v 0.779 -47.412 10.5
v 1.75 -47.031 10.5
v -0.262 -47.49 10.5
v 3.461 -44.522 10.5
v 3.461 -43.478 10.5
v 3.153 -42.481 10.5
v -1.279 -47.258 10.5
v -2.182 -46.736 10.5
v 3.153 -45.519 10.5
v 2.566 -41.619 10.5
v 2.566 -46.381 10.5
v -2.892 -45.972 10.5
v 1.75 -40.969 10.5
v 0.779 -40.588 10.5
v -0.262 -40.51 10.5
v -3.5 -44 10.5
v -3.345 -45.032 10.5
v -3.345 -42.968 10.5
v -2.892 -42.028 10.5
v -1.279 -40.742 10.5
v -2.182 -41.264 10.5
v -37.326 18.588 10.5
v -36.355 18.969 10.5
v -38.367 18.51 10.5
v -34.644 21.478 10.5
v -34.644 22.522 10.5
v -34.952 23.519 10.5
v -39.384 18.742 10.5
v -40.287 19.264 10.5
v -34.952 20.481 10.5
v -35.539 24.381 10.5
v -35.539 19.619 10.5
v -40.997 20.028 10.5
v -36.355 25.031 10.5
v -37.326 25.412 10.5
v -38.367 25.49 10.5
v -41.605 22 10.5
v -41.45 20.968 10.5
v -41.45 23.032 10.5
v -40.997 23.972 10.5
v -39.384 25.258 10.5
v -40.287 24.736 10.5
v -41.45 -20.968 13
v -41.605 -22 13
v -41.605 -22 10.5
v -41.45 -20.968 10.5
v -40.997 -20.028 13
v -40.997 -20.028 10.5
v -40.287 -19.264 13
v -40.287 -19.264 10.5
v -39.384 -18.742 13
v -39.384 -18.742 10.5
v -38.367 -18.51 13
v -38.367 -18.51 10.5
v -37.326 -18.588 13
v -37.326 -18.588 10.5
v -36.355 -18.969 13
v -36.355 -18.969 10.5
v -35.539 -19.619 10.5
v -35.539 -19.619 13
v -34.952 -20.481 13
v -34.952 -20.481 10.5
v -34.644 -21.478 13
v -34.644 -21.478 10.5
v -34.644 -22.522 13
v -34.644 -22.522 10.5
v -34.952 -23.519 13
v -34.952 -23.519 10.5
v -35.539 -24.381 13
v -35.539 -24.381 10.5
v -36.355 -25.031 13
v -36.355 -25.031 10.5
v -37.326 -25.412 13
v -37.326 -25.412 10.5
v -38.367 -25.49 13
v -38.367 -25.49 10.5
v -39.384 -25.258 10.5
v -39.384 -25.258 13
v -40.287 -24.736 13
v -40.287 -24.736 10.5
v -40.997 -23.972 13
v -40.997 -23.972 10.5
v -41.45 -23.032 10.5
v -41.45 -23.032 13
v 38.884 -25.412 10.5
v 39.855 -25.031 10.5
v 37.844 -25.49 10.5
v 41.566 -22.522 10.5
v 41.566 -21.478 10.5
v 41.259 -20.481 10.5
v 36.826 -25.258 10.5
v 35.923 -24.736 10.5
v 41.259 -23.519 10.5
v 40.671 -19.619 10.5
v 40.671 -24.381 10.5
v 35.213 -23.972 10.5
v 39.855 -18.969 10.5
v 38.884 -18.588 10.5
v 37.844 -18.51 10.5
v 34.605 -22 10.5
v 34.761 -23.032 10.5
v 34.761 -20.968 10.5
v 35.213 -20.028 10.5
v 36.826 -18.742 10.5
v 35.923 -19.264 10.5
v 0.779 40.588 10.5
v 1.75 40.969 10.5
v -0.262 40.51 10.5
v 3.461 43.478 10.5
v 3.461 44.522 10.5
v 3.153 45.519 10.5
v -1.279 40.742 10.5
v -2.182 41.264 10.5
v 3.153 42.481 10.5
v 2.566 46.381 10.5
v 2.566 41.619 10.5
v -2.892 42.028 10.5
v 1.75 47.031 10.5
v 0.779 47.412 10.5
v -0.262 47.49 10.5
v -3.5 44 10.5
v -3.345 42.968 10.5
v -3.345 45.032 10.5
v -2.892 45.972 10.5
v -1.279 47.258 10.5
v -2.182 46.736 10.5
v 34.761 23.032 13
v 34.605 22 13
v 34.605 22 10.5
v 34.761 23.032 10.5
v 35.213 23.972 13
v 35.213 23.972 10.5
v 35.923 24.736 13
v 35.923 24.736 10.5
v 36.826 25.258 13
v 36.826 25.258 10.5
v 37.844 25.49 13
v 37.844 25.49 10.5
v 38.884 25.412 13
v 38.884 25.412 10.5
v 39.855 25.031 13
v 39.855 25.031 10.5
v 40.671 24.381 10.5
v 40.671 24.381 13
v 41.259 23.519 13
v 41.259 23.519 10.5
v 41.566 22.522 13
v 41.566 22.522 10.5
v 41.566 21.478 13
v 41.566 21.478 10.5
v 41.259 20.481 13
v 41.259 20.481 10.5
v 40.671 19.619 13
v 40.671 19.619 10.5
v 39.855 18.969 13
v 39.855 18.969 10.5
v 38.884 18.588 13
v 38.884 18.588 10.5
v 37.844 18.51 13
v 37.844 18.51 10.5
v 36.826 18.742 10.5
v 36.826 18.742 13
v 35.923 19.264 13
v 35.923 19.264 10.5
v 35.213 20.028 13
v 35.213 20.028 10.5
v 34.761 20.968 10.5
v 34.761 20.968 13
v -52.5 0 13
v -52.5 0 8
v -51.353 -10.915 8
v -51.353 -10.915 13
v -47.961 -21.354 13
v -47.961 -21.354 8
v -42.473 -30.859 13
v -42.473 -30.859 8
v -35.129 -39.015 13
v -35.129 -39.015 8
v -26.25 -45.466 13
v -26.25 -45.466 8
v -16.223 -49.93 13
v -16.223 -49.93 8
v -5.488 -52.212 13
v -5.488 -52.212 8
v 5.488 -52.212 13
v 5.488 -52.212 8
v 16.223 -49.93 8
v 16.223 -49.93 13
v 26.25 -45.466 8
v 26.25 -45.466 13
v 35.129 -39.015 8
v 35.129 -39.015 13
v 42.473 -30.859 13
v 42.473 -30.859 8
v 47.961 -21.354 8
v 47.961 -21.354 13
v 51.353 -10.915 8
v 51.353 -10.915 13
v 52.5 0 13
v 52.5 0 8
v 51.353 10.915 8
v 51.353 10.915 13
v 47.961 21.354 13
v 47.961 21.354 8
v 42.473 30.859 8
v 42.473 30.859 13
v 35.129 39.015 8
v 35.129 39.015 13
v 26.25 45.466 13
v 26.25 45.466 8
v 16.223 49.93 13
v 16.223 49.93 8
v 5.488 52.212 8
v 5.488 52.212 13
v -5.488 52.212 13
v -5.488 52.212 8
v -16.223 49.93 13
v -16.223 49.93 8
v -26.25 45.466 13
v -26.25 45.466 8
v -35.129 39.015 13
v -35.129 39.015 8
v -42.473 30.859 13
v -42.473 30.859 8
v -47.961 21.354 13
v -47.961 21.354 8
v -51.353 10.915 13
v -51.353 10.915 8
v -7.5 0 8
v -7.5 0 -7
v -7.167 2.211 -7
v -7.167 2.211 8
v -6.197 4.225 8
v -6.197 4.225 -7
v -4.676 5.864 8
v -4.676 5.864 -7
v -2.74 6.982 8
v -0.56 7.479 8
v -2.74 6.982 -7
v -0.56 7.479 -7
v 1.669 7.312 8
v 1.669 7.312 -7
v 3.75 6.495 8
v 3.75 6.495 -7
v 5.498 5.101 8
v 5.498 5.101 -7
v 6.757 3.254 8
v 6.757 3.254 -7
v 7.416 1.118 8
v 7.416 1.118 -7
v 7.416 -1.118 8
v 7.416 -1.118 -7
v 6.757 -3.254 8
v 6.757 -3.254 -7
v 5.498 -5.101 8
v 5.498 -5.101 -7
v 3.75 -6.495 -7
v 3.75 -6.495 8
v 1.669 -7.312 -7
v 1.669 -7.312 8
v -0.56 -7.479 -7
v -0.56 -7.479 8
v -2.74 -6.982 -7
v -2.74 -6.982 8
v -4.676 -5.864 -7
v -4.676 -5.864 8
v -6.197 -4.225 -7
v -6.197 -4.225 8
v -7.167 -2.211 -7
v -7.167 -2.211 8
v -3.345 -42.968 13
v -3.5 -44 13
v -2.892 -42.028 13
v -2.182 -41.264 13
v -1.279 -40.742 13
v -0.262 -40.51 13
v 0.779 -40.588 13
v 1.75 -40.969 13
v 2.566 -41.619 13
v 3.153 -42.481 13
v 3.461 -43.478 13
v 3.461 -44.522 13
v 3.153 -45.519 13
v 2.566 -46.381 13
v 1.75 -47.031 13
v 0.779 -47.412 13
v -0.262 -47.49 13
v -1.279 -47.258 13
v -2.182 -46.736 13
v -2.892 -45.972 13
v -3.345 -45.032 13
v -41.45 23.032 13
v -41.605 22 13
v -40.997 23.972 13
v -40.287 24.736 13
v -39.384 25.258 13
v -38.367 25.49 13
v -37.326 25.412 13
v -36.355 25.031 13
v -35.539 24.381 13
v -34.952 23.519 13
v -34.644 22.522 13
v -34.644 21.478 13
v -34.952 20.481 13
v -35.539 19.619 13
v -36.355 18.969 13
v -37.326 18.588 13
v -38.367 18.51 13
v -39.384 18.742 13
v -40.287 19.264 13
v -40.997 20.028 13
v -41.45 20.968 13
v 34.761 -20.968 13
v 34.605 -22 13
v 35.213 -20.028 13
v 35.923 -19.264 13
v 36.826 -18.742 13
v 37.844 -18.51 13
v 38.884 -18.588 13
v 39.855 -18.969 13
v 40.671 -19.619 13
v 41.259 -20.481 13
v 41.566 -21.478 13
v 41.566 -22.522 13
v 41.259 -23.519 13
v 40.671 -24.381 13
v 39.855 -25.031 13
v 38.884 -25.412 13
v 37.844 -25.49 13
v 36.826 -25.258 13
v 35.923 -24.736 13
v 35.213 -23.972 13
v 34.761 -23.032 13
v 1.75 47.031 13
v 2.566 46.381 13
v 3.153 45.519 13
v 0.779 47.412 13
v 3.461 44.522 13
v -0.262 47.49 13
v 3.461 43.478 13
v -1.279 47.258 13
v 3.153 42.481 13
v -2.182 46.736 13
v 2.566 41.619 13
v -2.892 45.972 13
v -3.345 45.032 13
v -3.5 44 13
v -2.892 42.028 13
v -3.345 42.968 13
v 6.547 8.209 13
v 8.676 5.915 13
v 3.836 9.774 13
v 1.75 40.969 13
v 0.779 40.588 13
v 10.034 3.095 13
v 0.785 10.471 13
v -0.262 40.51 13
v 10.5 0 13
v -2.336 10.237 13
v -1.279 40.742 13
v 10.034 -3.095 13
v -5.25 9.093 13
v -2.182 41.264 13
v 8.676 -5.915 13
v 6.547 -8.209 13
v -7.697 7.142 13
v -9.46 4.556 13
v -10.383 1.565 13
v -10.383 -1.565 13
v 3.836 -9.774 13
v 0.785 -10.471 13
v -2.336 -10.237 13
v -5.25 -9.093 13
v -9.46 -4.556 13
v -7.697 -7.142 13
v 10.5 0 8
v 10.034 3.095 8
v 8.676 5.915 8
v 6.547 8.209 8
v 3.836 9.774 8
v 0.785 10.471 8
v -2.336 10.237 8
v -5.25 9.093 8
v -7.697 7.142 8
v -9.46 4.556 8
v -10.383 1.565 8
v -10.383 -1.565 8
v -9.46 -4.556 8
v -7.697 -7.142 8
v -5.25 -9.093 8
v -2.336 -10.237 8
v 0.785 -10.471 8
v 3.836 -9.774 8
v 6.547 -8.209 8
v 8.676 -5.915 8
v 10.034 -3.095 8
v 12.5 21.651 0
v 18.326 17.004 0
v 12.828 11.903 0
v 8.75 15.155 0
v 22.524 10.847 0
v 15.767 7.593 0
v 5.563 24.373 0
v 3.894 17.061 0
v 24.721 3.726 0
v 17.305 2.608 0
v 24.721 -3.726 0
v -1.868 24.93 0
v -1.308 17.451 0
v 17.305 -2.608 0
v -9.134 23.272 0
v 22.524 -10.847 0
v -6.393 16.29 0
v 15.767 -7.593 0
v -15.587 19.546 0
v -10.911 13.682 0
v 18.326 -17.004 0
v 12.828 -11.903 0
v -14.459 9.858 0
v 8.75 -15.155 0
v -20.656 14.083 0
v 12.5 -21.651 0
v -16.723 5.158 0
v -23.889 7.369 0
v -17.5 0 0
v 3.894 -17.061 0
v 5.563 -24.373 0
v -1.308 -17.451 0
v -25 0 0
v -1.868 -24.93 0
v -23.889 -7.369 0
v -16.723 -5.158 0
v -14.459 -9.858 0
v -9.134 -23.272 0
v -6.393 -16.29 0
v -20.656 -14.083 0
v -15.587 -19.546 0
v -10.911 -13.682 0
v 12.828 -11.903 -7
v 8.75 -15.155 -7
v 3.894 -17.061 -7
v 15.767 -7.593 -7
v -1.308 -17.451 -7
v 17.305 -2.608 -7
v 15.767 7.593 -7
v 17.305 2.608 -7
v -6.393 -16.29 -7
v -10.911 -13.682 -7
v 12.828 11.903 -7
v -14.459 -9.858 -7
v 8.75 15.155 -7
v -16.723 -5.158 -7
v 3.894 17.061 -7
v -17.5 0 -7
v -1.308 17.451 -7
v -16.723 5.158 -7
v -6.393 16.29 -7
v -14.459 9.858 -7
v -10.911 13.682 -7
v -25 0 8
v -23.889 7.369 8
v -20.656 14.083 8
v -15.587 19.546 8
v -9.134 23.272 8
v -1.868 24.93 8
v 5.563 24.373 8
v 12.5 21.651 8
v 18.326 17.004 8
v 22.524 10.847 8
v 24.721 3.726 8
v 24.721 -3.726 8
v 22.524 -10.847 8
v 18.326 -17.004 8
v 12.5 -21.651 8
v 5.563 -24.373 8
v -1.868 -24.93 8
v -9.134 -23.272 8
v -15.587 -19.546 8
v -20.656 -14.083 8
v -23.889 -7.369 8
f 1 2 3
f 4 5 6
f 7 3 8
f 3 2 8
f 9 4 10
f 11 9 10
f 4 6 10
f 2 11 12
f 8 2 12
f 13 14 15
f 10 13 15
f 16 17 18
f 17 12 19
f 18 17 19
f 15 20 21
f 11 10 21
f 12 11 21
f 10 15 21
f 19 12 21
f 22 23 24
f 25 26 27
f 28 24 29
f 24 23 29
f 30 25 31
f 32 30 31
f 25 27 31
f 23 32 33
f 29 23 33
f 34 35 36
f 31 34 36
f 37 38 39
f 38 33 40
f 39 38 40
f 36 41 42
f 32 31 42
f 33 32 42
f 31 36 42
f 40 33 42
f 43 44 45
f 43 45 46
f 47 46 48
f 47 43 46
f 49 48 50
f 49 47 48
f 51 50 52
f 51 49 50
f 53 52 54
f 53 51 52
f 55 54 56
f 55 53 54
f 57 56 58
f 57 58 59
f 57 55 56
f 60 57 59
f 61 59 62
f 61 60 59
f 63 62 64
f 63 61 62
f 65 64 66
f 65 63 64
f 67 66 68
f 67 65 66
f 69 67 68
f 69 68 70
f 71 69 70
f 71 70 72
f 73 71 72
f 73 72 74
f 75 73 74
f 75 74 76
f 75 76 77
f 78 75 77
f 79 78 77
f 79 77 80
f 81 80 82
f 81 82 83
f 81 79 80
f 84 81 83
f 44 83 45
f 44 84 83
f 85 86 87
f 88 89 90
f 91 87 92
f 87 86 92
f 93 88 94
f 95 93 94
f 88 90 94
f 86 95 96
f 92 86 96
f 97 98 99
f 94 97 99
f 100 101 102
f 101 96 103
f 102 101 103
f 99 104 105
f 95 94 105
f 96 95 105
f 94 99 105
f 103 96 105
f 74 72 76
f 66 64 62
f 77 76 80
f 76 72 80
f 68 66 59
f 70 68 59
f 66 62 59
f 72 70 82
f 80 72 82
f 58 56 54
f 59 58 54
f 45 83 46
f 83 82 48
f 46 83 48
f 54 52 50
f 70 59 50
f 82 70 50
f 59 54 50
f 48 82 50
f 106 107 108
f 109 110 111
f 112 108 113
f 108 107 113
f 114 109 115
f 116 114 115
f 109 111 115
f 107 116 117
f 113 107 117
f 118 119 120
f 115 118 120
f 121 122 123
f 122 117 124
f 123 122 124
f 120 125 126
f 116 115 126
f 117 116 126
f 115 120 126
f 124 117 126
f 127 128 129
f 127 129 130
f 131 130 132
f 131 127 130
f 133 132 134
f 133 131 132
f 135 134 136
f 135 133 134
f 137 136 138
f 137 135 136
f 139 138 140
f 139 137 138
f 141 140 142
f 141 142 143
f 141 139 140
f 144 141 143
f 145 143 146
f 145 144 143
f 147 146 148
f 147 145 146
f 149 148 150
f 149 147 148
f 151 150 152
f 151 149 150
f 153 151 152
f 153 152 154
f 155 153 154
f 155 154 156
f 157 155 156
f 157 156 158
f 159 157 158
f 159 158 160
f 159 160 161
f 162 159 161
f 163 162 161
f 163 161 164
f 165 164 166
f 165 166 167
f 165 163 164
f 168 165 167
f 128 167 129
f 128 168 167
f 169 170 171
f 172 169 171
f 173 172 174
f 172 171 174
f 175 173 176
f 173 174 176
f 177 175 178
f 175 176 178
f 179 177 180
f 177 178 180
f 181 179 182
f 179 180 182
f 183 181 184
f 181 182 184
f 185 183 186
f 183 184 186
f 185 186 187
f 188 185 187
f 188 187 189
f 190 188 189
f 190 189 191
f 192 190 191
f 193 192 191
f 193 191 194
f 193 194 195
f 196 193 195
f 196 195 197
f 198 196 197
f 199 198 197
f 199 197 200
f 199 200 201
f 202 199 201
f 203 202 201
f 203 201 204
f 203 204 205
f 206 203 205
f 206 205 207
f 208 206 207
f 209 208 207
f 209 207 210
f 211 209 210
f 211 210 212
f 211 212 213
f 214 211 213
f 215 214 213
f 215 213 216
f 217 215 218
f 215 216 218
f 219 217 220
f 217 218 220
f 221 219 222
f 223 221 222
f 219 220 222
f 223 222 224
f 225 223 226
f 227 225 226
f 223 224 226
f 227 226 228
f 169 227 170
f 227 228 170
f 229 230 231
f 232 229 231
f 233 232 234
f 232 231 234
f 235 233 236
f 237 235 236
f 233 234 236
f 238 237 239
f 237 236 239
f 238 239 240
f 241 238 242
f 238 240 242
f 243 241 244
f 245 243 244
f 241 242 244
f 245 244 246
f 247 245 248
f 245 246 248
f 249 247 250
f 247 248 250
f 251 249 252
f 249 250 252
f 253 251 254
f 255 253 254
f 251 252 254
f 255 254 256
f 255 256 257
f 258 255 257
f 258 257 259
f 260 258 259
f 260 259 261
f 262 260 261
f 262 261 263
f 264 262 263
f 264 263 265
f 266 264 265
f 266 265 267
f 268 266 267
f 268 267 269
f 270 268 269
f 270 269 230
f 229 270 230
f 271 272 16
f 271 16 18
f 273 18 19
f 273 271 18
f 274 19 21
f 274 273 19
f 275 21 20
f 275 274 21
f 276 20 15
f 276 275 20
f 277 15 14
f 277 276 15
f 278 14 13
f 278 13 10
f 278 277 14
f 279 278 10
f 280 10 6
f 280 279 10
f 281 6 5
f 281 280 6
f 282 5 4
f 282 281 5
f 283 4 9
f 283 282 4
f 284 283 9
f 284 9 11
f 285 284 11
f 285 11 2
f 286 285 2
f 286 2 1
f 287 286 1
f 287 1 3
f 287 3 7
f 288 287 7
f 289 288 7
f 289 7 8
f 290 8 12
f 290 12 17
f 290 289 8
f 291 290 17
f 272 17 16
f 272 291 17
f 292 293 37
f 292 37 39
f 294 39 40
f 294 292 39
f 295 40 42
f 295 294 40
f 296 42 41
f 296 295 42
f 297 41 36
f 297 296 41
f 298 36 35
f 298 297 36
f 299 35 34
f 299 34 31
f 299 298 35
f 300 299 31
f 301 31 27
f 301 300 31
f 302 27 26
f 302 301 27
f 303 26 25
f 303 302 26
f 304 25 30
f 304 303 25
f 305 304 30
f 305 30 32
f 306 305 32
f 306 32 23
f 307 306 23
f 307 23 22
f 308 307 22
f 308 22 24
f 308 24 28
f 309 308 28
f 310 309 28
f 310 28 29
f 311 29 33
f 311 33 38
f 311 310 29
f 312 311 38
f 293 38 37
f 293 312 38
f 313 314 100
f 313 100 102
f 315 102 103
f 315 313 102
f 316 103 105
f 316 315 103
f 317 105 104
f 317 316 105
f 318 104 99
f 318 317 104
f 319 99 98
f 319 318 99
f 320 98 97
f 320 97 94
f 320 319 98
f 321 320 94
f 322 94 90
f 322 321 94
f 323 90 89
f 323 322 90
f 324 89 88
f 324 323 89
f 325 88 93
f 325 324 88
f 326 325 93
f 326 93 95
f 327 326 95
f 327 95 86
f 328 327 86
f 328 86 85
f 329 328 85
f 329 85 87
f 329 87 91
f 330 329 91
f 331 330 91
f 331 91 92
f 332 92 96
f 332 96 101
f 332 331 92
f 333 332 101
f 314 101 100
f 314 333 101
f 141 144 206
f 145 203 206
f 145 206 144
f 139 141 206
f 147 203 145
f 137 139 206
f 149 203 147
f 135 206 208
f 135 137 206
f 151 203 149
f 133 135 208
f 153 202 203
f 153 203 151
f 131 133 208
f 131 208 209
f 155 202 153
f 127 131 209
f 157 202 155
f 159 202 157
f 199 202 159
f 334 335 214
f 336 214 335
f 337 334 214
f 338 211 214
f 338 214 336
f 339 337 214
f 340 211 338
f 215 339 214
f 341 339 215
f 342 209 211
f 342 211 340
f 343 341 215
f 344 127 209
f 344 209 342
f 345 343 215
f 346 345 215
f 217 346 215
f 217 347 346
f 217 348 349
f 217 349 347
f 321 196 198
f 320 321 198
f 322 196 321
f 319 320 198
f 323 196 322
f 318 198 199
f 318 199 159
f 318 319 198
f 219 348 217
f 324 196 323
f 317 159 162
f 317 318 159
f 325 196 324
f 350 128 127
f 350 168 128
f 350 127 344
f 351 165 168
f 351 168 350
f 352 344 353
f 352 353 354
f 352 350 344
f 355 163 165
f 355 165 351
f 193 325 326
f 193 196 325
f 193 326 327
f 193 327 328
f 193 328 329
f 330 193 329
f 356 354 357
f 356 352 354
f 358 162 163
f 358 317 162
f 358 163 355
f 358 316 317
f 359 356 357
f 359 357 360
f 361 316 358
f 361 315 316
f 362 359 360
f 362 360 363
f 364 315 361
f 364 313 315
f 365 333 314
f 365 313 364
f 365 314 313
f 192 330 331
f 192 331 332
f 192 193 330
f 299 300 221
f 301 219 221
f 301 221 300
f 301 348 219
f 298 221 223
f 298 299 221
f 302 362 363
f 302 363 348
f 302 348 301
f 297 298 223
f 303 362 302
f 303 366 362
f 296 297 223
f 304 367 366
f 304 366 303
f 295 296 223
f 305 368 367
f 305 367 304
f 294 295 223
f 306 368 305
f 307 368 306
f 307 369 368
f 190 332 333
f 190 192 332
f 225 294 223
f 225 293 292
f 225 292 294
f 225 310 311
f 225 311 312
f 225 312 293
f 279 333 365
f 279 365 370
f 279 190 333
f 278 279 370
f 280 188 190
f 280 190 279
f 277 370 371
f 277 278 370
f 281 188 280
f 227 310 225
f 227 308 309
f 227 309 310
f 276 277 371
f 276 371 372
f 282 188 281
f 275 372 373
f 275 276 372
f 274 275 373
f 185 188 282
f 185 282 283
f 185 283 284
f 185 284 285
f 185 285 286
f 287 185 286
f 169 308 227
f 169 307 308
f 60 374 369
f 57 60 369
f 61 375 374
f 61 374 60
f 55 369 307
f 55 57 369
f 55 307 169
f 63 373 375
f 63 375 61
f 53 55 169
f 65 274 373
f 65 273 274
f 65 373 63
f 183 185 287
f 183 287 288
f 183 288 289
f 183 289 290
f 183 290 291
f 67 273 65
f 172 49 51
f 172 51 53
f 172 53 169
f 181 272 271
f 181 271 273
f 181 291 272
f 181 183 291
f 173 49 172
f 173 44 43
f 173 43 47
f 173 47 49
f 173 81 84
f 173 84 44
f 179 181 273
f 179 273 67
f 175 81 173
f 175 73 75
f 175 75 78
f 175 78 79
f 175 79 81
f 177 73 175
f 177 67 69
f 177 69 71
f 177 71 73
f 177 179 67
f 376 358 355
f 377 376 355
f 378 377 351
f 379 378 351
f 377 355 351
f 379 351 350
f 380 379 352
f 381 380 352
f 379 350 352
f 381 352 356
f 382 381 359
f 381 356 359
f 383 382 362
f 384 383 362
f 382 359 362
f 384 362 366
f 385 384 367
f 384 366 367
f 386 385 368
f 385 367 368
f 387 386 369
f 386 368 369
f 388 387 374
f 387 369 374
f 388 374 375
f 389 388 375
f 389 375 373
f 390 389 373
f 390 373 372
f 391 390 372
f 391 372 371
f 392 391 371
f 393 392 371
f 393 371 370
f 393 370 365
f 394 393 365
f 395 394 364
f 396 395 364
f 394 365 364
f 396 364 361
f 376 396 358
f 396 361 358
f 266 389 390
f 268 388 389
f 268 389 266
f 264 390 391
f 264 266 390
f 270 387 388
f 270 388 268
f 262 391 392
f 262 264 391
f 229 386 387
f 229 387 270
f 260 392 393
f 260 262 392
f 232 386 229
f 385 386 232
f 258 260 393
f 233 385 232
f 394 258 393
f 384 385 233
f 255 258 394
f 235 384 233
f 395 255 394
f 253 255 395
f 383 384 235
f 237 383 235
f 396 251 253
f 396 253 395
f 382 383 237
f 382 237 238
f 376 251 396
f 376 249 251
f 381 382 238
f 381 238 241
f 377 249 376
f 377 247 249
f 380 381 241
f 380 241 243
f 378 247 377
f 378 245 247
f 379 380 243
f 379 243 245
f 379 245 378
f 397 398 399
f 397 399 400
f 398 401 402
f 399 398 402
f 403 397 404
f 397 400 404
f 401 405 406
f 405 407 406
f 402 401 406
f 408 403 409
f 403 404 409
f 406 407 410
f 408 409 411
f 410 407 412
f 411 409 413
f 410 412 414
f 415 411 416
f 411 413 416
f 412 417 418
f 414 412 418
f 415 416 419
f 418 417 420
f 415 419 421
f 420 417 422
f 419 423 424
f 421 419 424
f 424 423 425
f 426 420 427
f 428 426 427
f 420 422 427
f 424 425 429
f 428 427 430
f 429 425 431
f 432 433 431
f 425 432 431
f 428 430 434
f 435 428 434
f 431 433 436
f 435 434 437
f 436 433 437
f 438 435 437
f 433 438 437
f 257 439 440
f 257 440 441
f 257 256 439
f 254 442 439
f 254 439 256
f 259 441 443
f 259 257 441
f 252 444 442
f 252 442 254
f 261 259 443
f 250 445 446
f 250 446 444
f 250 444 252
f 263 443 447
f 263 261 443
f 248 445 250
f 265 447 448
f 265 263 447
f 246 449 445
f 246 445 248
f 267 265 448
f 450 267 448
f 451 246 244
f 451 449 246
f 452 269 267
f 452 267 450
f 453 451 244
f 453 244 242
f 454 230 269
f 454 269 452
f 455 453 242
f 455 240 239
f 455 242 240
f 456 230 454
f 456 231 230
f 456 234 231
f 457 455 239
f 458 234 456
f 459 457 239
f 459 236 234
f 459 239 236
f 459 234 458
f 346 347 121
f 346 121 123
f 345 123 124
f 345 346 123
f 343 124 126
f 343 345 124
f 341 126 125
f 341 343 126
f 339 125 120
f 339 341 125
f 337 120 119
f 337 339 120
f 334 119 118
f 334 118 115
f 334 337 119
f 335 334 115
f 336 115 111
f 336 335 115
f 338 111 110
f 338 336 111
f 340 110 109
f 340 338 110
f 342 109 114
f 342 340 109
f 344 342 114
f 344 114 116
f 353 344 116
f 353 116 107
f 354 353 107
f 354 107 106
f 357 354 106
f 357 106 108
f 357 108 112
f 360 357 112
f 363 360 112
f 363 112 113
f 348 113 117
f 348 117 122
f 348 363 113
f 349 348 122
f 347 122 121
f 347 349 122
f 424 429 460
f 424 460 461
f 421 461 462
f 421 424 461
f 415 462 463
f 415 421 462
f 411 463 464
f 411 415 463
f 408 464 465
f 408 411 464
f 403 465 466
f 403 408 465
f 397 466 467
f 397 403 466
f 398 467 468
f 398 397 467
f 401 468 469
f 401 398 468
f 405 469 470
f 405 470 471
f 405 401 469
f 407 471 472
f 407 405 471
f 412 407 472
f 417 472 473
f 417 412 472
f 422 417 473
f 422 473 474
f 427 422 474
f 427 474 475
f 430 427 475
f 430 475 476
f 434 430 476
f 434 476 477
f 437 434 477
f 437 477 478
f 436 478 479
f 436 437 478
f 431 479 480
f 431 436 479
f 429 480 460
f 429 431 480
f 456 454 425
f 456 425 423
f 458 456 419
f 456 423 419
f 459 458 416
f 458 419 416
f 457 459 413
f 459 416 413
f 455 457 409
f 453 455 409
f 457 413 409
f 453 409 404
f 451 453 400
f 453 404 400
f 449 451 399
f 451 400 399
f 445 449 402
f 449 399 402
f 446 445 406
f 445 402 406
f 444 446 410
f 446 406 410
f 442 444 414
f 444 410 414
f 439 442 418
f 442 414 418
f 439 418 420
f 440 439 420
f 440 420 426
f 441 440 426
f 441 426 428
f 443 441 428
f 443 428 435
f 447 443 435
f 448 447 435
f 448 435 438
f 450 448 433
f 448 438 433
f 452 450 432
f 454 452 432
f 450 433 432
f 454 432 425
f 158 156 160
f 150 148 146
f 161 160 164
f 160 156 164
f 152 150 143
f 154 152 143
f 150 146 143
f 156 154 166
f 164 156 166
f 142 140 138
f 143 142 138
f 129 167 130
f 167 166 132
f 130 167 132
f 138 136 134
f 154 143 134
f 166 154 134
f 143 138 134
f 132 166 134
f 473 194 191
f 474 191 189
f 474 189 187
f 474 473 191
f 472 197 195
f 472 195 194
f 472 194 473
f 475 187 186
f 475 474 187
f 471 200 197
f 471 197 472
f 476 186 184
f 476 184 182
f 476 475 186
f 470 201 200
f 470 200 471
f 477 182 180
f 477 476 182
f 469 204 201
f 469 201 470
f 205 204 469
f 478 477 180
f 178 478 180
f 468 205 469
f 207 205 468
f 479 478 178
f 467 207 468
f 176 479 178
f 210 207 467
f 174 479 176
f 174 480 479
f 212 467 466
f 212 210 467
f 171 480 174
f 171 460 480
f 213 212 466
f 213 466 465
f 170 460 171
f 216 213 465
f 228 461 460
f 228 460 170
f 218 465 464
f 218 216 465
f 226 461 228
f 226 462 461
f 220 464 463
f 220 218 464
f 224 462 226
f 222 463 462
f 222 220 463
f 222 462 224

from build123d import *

# Parameters (mm, degrees)
SKETCH1_R           = 52.5
BOSS_EXTRUDE1_DEPTH = 13
SKETCH2_R           = 17.5
BOSS_EXTRUDE2_DEPTH = 7
SKETCH3_R           = 52.5
SKETCH3_R_2         = 25
CUT_EXTRUDE1_DEPTH  = 8
SKETCH4_R           = 7.5
CUT_EXTRUDE2_DEPTH  = 77.892782496
SKETCH5_R           = 10.5
CUT_EXTRUDE3_DEPTH  = 5
SKETCH6_R           = 3.5
CUT_EXTRUDE4_DEPTH  = 2.5


with BuildPart() as part:
    # Sketch1 → Boss-Extrude1 (new body)
    with BuildSketch(Plane.XY):
        with Locations(Location((0, 0, 0), (0, 0, 180))):
            Circle(SKETCH1_R)
    extrude(amount=BOSS_EXTRUDE1_DEPTH)

    # Sketch2 → Boss-Extrude2 (add)
    with BuildSketch(Plane(origin=(0, 0, 0), x_dir=(-1, 0, 0), z_dir=(0, 0, -1))):
        Circle(SKETCH2_R)
    extrude(amount=BOSS_EXTRUDE2_DEPTH)

    # Sketch3 → Cut-Extrude1 (cut)
    with BuildSketch(Plane(origin=(0, 0, 0), x_dir=(-1, 0, 0), z_dir=(0, 0, -1))):
        Circle(SKETCH3_R)
        Circle(SKETCH3_R_2, mode=Mode.SUBTRACT)
    extrude(amount=-CUT_EXTRUDE1_DEPTH, mode=Mode.SUBTRACT)

    # Sketch4 → Cut-Extrude2 (cut, through all)
    with BuildSketch(Plane(origin=(0, 0, -7), x_dir=(-1, 0, 0), z_dir=(0, 0, -1))):
        Circle(SKETCH4_R)
    extrude(amount=-CUT_EXTRUDE2_DEPTH, mode=Mode.SUBTRACT)

    # Sketch5 → Cut-Extrude3 (cut)
    with BuildSketch(Plane.XY.offset(13)):
        Circle(SKETCH5_R)
    extrude(amount=-CUT_EXTRUDE3_DEPTH, mode=Mode.SUBTRACT)

    # Sketch6 → Cut-Extrude4 (cut)
    with BuildSketch(Plane(origin=(0, 0, 13), x_dir=(-1, 0, 0), z_dir=(0, 0, -1))):
        with Locations((0, 44)):
            Circle(SKETCH6_R)
        with Locations((38.105117767, 22)):
            Circle(SKETCH6_R)
        with Locations((38.105117767, -22)):
            Circle(SKETCH6_R)
        with Locations((0, -44)):
            Circle(SKETCH6_R)
        with Locations((-38.105117767, -22)):
            Circle(SKETCH6_R)
        with Locations((-38.105117767, 22)):
            Circle(SKETCH6_R)
    extrude(amount=CUT_EXTRUDE4_DEPTH, mode=Mode.SUBTRACT)


solid = part.part
